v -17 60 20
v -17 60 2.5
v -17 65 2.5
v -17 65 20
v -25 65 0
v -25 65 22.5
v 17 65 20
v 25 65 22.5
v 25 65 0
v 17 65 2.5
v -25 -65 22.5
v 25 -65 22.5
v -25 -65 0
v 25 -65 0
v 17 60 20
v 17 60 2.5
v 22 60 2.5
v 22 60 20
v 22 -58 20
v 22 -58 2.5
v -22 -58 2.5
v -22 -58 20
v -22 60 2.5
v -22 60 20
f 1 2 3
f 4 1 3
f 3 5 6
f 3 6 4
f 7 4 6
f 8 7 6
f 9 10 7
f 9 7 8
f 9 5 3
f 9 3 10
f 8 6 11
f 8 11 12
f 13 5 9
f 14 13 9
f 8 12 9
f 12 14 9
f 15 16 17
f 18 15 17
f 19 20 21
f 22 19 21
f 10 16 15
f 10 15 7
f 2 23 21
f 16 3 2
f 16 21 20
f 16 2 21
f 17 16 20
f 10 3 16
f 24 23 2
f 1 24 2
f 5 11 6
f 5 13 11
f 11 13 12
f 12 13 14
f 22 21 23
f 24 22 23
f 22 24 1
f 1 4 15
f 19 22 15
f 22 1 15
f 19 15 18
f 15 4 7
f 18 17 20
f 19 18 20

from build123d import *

# Parameters (mm, degrees)
F1_DEPTH = 2.5
F0_W     = 5
F0_H     = 5
F2_DEPTH = 20
F3_W     = 50
F3_H     = 130
F4_DEPTH = 2.5


with BuildPart() as f1:
    # F0 (on Top) → F1 (new body)
    with BuildSketch(Plane.XY):
        Polygon((17, 60), (17, 65), (-17, 65), (-17, 60), (-22, 60), (-22, -58), (22, -58), (22, 60), align=None)
    extrude(amount=F1_DEPTH)

    # F0 (on Top) → F2 (join)
    with BuildSketch(Plane.XY):
        with Locations((19.5, 62.5)):
            Rectangle(F0_W, F0_H)
        Polygon((25, -65), (25, 65), (22, 65), (22, 60), (22, -58), (-22, -58), (-22, 60), (-22, 65), (-25, 65), (-25, -65), align=None)
        with Locations((-19.5, 62.5)):
            Rectangle(F0_W, F0_H)
    extrude(amount=F2_DEPTH)

    # F3 (on face) → F4 (join)
    with BuildSketch(Plane.XY.offset(20)):
        Rectangle(F3_W, F3_H)
    extrude(amount=F4_DEPTH)


solid = f1.part
